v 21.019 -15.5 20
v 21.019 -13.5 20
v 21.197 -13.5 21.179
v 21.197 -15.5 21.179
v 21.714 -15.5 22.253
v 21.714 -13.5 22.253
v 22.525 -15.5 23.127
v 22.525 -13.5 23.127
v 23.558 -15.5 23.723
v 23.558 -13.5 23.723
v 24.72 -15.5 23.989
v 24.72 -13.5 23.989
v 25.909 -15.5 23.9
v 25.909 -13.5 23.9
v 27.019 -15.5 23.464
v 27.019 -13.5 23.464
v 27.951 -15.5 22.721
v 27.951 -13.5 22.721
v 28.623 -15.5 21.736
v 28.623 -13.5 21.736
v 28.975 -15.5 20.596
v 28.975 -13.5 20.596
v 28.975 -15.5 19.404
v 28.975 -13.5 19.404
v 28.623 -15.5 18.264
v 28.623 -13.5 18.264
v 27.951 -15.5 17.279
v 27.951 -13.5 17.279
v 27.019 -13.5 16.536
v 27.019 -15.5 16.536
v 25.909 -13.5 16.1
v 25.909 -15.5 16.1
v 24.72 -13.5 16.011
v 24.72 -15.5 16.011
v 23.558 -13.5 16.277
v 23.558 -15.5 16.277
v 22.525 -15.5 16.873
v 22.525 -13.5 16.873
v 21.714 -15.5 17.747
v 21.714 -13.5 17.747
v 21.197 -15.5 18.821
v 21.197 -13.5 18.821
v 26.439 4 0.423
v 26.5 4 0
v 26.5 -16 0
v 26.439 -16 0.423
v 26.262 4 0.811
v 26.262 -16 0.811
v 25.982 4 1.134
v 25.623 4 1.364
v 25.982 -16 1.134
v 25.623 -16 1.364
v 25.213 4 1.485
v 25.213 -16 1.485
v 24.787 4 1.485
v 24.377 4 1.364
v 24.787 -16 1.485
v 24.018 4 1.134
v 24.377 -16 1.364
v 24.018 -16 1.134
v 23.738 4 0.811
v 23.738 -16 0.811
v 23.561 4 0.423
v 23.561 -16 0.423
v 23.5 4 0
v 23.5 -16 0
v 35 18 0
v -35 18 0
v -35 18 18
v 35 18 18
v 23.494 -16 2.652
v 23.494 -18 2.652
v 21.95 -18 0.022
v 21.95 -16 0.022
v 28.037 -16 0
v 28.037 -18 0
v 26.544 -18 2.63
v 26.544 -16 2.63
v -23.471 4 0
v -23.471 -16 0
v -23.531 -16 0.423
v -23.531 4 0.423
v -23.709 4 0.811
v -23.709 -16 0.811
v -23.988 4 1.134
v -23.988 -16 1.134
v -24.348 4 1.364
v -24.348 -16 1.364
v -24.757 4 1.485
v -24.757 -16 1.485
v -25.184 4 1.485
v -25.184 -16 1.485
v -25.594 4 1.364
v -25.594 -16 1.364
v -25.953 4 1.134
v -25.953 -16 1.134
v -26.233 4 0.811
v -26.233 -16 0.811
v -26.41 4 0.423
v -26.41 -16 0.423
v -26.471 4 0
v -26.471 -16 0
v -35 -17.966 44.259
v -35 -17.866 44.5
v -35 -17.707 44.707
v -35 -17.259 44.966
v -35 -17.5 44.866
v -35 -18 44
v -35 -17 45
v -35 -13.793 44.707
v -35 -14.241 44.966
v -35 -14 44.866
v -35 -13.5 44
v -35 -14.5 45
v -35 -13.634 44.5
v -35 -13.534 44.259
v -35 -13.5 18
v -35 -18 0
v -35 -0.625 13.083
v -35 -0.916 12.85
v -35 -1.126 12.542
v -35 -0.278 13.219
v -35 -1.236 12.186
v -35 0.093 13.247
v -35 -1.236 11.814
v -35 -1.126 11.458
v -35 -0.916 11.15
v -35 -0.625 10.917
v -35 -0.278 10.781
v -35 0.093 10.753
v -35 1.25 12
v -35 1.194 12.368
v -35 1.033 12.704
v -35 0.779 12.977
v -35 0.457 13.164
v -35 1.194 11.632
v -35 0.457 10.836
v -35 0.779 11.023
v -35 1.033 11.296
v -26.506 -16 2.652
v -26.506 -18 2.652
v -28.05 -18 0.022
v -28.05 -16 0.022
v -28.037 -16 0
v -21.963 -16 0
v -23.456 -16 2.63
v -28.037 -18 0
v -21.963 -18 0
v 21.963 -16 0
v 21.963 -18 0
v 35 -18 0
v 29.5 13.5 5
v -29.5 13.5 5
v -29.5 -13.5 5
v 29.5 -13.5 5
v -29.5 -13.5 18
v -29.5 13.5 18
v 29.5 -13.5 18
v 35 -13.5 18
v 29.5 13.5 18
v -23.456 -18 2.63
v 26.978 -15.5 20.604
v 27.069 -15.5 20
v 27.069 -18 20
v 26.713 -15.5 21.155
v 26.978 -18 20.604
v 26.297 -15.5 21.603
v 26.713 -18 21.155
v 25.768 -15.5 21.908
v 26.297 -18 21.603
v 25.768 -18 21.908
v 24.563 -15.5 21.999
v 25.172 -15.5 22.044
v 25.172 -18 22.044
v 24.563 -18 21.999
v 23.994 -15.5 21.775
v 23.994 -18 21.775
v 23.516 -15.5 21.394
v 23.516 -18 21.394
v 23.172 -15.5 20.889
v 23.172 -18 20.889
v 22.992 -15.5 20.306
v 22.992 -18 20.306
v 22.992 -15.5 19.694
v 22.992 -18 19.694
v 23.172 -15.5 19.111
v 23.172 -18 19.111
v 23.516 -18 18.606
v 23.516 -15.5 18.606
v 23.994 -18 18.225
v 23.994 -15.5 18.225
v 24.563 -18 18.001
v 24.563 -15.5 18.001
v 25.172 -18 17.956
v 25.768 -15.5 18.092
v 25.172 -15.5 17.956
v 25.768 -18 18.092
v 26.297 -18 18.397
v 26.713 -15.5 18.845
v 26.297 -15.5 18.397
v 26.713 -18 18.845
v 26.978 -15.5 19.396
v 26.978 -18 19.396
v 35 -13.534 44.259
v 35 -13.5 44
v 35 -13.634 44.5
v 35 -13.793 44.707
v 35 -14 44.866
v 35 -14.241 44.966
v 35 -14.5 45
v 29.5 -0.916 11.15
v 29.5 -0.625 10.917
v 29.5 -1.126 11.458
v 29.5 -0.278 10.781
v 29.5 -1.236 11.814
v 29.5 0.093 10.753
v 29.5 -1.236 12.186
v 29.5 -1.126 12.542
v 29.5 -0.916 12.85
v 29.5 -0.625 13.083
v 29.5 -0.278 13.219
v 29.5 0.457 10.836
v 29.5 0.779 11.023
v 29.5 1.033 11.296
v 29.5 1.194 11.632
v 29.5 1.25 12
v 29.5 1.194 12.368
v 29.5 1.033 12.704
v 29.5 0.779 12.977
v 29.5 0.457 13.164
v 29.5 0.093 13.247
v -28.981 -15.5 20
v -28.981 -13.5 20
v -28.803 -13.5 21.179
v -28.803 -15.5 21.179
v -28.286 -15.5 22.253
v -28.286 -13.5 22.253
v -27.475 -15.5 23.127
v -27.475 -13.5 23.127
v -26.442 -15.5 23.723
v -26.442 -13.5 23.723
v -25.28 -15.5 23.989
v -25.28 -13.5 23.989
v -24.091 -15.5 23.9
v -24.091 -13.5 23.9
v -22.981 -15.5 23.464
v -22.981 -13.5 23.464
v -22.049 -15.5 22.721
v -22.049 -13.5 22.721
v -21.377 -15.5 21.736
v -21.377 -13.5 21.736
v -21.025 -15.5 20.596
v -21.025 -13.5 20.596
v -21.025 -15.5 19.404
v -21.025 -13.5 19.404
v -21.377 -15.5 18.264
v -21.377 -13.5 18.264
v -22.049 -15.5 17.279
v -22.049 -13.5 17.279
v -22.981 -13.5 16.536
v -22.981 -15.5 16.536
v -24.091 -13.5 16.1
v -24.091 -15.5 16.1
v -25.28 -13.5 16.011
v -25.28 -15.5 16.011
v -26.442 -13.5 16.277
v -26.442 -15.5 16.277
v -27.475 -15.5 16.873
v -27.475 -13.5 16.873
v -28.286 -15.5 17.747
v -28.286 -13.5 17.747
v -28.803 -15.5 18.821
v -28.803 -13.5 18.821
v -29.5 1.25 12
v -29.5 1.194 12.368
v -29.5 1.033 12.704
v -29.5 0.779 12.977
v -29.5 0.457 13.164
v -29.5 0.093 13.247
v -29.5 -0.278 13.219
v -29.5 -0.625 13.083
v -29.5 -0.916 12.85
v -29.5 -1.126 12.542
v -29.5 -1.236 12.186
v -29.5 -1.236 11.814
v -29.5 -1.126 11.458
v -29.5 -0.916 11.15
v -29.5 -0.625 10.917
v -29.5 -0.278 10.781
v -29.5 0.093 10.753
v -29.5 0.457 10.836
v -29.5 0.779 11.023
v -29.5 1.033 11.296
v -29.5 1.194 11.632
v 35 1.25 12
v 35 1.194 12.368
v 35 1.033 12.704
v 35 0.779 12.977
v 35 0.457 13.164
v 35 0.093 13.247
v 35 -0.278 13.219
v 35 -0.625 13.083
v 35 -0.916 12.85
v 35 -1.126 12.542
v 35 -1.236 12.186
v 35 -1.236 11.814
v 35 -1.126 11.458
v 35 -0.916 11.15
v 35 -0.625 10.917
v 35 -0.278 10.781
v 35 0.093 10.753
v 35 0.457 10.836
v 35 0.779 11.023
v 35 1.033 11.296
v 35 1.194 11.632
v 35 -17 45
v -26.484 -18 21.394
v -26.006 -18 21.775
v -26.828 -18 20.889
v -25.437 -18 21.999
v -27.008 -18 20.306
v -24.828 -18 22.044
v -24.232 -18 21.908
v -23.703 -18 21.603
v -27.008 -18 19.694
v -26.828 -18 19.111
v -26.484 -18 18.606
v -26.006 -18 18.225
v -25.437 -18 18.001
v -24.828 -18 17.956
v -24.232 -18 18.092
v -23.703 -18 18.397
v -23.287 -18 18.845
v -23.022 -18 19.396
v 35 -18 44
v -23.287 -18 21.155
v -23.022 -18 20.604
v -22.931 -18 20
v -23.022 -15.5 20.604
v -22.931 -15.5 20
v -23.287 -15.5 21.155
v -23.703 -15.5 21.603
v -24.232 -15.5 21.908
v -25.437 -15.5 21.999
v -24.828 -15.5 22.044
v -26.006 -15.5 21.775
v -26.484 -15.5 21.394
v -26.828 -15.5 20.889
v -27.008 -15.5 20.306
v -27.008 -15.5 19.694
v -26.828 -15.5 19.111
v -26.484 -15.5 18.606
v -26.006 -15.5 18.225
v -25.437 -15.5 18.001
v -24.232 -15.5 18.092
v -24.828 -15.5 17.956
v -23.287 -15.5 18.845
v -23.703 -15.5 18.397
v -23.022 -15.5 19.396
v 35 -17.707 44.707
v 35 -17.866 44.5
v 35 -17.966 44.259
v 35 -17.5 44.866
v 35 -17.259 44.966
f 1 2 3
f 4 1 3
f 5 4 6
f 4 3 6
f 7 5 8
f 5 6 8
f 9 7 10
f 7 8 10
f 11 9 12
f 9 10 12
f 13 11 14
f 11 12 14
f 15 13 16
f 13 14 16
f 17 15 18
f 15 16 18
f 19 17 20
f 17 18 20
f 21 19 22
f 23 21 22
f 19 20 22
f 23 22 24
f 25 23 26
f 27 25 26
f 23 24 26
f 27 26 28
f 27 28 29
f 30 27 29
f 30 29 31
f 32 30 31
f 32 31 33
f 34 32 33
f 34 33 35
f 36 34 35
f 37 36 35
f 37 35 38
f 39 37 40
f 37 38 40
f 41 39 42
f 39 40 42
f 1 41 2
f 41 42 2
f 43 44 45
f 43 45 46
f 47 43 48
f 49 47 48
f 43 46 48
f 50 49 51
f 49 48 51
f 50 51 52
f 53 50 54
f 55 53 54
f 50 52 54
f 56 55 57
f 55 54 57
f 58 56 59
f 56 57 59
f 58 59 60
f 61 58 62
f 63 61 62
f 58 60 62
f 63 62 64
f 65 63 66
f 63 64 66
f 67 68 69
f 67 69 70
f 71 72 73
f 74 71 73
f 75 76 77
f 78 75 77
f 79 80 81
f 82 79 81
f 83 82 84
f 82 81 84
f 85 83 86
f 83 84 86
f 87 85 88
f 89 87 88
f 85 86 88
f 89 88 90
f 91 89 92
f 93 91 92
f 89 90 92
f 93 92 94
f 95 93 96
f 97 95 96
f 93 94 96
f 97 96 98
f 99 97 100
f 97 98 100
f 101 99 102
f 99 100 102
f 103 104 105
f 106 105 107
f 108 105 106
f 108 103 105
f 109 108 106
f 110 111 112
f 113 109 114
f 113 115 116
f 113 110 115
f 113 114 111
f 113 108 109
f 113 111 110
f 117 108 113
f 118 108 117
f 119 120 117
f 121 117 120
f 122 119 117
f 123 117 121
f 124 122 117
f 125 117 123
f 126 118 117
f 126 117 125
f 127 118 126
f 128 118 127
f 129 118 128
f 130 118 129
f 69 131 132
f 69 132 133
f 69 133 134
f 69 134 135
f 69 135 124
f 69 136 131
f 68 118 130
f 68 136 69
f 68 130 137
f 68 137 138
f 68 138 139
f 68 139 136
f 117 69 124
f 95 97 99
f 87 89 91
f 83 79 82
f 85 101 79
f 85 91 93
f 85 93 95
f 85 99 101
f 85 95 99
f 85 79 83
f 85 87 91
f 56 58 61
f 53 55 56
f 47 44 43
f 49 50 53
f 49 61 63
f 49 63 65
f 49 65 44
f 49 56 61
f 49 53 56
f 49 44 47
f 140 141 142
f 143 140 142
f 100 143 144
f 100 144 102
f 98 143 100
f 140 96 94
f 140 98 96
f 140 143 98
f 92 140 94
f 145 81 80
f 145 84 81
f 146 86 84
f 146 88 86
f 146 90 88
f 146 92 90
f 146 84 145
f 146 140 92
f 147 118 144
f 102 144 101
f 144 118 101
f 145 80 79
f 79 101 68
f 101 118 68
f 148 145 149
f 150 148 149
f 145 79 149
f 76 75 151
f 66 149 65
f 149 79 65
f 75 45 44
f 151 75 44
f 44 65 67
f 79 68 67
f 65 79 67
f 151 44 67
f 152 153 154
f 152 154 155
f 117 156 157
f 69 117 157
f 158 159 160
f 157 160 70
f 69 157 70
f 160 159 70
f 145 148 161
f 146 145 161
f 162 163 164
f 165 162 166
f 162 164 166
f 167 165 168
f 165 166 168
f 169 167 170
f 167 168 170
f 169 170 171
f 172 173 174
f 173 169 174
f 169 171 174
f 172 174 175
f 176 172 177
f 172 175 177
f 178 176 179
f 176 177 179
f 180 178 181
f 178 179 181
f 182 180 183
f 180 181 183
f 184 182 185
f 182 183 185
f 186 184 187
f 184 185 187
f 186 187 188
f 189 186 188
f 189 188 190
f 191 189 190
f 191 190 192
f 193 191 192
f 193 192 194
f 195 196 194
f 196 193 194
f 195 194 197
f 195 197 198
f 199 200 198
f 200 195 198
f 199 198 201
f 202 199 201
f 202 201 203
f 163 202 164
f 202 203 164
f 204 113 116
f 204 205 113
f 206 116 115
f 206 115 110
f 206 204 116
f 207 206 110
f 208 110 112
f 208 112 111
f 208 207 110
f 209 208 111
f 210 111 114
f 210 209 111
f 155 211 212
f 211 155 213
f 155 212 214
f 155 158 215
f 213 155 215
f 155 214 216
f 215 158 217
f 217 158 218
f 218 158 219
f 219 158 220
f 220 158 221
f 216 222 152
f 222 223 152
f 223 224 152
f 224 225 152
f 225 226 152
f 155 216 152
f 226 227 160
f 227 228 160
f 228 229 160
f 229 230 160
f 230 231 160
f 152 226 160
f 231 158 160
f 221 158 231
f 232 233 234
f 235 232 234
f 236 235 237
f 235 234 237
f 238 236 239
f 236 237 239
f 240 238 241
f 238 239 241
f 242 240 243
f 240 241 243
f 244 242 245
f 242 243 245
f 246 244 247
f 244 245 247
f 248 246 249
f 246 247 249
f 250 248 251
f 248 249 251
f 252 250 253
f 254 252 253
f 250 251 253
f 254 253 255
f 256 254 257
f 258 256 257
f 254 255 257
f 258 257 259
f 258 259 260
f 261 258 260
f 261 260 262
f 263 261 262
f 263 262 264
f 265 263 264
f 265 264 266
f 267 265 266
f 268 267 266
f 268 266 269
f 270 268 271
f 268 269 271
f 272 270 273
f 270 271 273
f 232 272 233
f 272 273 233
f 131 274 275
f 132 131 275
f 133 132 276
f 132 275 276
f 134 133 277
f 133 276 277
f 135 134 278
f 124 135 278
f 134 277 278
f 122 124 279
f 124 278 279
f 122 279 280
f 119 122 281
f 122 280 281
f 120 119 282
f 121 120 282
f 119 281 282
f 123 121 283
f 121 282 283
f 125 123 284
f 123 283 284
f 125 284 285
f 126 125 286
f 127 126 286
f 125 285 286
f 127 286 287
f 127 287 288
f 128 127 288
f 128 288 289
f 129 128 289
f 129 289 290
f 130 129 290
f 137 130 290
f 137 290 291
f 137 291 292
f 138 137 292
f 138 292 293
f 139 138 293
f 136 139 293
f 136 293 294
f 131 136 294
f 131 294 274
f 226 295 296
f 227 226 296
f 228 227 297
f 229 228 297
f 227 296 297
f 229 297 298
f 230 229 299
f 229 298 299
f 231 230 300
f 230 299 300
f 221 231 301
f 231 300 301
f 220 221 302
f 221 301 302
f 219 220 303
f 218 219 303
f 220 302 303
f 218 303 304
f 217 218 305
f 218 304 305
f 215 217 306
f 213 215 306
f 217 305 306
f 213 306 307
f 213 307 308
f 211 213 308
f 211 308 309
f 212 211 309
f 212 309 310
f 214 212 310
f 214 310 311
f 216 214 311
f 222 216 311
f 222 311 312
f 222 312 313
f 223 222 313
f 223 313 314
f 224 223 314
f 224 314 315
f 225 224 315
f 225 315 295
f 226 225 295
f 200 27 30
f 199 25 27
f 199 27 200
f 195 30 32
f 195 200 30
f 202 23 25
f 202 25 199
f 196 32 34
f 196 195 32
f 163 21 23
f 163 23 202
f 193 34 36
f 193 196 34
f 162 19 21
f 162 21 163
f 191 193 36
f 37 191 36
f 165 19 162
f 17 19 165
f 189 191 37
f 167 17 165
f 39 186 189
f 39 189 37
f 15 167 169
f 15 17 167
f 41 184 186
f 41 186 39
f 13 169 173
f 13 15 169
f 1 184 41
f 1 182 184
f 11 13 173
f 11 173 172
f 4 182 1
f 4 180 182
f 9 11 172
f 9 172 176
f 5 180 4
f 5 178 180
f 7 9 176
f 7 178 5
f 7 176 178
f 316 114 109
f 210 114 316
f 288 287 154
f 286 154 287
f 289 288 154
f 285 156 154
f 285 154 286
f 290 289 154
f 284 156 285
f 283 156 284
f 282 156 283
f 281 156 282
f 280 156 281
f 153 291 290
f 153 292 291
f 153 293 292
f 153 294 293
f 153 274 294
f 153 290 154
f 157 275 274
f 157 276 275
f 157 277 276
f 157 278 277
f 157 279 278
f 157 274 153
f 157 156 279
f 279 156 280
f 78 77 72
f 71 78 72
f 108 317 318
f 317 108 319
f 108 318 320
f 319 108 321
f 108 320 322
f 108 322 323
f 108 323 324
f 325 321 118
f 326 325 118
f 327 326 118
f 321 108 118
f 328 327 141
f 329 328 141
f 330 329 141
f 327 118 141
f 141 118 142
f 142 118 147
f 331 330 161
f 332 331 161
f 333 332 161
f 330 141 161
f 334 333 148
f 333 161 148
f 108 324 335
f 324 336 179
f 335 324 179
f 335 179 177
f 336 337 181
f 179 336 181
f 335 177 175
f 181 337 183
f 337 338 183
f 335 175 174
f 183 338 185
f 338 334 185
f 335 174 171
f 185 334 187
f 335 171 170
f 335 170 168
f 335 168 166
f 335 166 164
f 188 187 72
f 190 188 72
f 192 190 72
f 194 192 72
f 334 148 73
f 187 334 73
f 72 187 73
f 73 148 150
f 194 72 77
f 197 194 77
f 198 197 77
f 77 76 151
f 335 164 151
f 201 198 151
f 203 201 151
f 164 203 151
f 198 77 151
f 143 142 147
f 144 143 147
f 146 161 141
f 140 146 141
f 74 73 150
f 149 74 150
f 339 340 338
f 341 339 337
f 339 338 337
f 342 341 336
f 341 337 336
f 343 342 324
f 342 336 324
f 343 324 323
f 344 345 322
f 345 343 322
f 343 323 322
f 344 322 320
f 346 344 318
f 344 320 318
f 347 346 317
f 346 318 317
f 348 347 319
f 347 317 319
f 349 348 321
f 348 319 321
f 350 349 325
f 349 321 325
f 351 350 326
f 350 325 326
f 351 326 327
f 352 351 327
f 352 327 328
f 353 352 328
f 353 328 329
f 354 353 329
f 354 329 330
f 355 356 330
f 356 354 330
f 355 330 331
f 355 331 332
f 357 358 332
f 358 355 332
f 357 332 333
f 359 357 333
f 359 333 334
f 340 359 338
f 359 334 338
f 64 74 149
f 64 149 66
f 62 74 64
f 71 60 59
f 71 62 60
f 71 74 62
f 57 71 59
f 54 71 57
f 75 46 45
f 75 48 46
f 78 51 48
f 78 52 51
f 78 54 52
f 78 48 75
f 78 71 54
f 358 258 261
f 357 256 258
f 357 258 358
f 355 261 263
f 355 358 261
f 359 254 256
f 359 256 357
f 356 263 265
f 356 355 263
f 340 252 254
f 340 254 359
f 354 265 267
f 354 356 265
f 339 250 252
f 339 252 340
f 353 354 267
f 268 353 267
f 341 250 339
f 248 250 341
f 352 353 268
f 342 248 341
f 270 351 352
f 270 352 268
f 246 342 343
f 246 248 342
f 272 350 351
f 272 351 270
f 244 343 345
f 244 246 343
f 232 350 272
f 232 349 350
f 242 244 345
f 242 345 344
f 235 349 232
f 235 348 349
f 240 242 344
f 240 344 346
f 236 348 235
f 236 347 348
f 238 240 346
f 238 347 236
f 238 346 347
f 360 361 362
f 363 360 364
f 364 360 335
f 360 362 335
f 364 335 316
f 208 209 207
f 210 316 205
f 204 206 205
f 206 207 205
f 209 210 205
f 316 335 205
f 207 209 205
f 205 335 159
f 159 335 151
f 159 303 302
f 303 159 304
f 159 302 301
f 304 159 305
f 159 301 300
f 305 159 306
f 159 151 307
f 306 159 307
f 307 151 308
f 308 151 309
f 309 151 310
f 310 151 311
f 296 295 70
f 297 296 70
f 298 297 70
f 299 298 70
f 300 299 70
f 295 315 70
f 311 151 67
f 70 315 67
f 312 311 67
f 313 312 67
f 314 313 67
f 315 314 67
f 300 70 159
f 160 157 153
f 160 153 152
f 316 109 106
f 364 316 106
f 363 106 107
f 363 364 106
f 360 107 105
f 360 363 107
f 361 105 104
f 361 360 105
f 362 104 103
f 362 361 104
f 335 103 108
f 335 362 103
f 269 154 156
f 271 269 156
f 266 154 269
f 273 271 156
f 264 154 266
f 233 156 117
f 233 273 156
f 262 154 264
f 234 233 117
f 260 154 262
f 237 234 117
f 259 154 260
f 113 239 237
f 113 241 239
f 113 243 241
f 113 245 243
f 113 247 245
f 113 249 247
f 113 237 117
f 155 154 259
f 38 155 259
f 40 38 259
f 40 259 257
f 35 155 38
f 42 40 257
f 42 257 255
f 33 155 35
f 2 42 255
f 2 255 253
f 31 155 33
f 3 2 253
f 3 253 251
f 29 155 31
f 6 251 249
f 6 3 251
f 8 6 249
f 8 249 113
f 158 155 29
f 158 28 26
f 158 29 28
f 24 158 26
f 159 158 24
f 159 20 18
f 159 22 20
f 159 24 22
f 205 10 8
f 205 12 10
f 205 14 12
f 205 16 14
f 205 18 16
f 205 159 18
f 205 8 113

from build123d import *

# Parameters (mm, degrees)
F0_W      = 70
F0_H      = 36
F1_DEPTH  = 45
F2_W      = 59
F2_H      = 27
F3_DEPTH  = 40
F4_W      = 31.5
F4_H      = 27
F4_W_2    = 0.0242067426
F5_DEPTH  = 70.001
F6_R      = 1.25
F7_DEPTH  = 70.001
F9_DEPTH  = 2
F10_R     = 1.5
F11_DEPTH = 20
F12_R     = 2.05
F13_DEPTH = 25.4
F14_R     = 4
F14_R_2   = 2.05
F15_DEPTH = 2
F16_R     = 1


with BuildPart() as f1:
    # F0 (on Top) → F1 (new body)
    with BuildSketch(Plane.XY):
        Rectangle(F0_W, F0_H)
    extrude(amount=F1_DEPTH)

    # F2 (on face) → F3 (cut)
    with BuildSketch(Plane.XY.offset(45)):
        Rectangle(F2_W, F2_H)
    extrude(amount=-F3_DEPTH, mode=Mode.SUBTRACT)

    # F4 (on face) → F5 (cut, through all)
    with BuildSketch(Plane.YZ.offset(35)):
        with Locations((2.25, 31.5)):
            Rectangle(F4_W, F4_H)
        with Locations((18.0121033713, 31.5)):
            Rectangle(F4_W_2, F4_H)
    extrude(amount=-F5_DEPTH, mode=Mode.SUBTRACT)

    # F6 (on face) → F7 (cut, through all)
    with BuildSketch(Plane.YZ.offset(35)):
        with Locations((0, 12)):
            Circle(F6_R)
    extrude(amount=-F7_DEPTH, mode=Mode.SUBTRACT)

    # F8 (on face) → F9 (cut)
    with BuildSketch(Plane.XZ.offset(18)):
        Polygon((-28.0374098564, 0), (-21.9625901436, 0), (-23.4557936101, 2.6302886672), (-26.5057936101, 2.6524662959), (-28.05, 0.0221776287), align=None)
        Polygon((21.95, 0.0221776287), (21.9625901436, 0), (28.0374098564, 0), (26.5442063899, 2.6302886672), (23.4942063899, 2.6524662959), align=None)
    extrude(amount=-F9_DEPTH, mode=Mode.SUBTRACT)

    # F10 (on face) → F11 (cut)
    with BuildSketch(Plane.XZ.offset(16)):
        with BuildLine():
            Line((23.5, 0), (26.5, 0))
            ThreePointArc((26.5, 0), (25, 1.5), (23.5, 0))
        make_face()
        with BuildLine():
            ThreePointArc((23.5, 0), (25, -1.5), (26.5, 0))
            Line((26.5, 0), (23.5, 0))
        make_face()
        with Locations((-24.9706488103, 0)):
            Circle(F10_R)
    extrude(amount=-F11_DEPTH, mode=Mode.SUBTRACT)

    # F12 (on face) → F13 (cut)
    with BuildSketch(Plane.XZ.offset(18)):
        with Locations((-24.9807936101, 20)):
            Circle(F12_R)
        with Locations((25.0192063899, 20)):
            Circle(F12_R)
    extrude(amount=-F13_DEPTH, mode=Mode.SUBTRACT)

    # F14 (on face) → F15 (cut)
    with BuildSketch(Plane(origin=(0, -13.5, 0), x_dir=(-1, 0, 0), z_dir=(0, 1, 0))):
        with Locations((24.9807936101, 20)):
            Circle(F14_R)
        with Locations((24.9807936101, 20)):
            Circle(F14_R_2, mode=Mode.SUBTRACT)
        with Locations((-25.0192063899, 20)):
            Circle(F14_R)
        with Locations((-25.0192063899, 20)):
            Circle(F14_R_2, mode=Mode.SUBTRACT)
    extrude(amount=-F15_DEPTH, mode=Mode.SUBTRACT)

    # F16
    f16_edges = [f1.edges().sort_by_distance(p)[0] for p in [
        (0, -13.5, 45),
        (0, -18, 45),
    ]]
    fillet(f16_edges, radius=F16_R)


solid = f1.part
